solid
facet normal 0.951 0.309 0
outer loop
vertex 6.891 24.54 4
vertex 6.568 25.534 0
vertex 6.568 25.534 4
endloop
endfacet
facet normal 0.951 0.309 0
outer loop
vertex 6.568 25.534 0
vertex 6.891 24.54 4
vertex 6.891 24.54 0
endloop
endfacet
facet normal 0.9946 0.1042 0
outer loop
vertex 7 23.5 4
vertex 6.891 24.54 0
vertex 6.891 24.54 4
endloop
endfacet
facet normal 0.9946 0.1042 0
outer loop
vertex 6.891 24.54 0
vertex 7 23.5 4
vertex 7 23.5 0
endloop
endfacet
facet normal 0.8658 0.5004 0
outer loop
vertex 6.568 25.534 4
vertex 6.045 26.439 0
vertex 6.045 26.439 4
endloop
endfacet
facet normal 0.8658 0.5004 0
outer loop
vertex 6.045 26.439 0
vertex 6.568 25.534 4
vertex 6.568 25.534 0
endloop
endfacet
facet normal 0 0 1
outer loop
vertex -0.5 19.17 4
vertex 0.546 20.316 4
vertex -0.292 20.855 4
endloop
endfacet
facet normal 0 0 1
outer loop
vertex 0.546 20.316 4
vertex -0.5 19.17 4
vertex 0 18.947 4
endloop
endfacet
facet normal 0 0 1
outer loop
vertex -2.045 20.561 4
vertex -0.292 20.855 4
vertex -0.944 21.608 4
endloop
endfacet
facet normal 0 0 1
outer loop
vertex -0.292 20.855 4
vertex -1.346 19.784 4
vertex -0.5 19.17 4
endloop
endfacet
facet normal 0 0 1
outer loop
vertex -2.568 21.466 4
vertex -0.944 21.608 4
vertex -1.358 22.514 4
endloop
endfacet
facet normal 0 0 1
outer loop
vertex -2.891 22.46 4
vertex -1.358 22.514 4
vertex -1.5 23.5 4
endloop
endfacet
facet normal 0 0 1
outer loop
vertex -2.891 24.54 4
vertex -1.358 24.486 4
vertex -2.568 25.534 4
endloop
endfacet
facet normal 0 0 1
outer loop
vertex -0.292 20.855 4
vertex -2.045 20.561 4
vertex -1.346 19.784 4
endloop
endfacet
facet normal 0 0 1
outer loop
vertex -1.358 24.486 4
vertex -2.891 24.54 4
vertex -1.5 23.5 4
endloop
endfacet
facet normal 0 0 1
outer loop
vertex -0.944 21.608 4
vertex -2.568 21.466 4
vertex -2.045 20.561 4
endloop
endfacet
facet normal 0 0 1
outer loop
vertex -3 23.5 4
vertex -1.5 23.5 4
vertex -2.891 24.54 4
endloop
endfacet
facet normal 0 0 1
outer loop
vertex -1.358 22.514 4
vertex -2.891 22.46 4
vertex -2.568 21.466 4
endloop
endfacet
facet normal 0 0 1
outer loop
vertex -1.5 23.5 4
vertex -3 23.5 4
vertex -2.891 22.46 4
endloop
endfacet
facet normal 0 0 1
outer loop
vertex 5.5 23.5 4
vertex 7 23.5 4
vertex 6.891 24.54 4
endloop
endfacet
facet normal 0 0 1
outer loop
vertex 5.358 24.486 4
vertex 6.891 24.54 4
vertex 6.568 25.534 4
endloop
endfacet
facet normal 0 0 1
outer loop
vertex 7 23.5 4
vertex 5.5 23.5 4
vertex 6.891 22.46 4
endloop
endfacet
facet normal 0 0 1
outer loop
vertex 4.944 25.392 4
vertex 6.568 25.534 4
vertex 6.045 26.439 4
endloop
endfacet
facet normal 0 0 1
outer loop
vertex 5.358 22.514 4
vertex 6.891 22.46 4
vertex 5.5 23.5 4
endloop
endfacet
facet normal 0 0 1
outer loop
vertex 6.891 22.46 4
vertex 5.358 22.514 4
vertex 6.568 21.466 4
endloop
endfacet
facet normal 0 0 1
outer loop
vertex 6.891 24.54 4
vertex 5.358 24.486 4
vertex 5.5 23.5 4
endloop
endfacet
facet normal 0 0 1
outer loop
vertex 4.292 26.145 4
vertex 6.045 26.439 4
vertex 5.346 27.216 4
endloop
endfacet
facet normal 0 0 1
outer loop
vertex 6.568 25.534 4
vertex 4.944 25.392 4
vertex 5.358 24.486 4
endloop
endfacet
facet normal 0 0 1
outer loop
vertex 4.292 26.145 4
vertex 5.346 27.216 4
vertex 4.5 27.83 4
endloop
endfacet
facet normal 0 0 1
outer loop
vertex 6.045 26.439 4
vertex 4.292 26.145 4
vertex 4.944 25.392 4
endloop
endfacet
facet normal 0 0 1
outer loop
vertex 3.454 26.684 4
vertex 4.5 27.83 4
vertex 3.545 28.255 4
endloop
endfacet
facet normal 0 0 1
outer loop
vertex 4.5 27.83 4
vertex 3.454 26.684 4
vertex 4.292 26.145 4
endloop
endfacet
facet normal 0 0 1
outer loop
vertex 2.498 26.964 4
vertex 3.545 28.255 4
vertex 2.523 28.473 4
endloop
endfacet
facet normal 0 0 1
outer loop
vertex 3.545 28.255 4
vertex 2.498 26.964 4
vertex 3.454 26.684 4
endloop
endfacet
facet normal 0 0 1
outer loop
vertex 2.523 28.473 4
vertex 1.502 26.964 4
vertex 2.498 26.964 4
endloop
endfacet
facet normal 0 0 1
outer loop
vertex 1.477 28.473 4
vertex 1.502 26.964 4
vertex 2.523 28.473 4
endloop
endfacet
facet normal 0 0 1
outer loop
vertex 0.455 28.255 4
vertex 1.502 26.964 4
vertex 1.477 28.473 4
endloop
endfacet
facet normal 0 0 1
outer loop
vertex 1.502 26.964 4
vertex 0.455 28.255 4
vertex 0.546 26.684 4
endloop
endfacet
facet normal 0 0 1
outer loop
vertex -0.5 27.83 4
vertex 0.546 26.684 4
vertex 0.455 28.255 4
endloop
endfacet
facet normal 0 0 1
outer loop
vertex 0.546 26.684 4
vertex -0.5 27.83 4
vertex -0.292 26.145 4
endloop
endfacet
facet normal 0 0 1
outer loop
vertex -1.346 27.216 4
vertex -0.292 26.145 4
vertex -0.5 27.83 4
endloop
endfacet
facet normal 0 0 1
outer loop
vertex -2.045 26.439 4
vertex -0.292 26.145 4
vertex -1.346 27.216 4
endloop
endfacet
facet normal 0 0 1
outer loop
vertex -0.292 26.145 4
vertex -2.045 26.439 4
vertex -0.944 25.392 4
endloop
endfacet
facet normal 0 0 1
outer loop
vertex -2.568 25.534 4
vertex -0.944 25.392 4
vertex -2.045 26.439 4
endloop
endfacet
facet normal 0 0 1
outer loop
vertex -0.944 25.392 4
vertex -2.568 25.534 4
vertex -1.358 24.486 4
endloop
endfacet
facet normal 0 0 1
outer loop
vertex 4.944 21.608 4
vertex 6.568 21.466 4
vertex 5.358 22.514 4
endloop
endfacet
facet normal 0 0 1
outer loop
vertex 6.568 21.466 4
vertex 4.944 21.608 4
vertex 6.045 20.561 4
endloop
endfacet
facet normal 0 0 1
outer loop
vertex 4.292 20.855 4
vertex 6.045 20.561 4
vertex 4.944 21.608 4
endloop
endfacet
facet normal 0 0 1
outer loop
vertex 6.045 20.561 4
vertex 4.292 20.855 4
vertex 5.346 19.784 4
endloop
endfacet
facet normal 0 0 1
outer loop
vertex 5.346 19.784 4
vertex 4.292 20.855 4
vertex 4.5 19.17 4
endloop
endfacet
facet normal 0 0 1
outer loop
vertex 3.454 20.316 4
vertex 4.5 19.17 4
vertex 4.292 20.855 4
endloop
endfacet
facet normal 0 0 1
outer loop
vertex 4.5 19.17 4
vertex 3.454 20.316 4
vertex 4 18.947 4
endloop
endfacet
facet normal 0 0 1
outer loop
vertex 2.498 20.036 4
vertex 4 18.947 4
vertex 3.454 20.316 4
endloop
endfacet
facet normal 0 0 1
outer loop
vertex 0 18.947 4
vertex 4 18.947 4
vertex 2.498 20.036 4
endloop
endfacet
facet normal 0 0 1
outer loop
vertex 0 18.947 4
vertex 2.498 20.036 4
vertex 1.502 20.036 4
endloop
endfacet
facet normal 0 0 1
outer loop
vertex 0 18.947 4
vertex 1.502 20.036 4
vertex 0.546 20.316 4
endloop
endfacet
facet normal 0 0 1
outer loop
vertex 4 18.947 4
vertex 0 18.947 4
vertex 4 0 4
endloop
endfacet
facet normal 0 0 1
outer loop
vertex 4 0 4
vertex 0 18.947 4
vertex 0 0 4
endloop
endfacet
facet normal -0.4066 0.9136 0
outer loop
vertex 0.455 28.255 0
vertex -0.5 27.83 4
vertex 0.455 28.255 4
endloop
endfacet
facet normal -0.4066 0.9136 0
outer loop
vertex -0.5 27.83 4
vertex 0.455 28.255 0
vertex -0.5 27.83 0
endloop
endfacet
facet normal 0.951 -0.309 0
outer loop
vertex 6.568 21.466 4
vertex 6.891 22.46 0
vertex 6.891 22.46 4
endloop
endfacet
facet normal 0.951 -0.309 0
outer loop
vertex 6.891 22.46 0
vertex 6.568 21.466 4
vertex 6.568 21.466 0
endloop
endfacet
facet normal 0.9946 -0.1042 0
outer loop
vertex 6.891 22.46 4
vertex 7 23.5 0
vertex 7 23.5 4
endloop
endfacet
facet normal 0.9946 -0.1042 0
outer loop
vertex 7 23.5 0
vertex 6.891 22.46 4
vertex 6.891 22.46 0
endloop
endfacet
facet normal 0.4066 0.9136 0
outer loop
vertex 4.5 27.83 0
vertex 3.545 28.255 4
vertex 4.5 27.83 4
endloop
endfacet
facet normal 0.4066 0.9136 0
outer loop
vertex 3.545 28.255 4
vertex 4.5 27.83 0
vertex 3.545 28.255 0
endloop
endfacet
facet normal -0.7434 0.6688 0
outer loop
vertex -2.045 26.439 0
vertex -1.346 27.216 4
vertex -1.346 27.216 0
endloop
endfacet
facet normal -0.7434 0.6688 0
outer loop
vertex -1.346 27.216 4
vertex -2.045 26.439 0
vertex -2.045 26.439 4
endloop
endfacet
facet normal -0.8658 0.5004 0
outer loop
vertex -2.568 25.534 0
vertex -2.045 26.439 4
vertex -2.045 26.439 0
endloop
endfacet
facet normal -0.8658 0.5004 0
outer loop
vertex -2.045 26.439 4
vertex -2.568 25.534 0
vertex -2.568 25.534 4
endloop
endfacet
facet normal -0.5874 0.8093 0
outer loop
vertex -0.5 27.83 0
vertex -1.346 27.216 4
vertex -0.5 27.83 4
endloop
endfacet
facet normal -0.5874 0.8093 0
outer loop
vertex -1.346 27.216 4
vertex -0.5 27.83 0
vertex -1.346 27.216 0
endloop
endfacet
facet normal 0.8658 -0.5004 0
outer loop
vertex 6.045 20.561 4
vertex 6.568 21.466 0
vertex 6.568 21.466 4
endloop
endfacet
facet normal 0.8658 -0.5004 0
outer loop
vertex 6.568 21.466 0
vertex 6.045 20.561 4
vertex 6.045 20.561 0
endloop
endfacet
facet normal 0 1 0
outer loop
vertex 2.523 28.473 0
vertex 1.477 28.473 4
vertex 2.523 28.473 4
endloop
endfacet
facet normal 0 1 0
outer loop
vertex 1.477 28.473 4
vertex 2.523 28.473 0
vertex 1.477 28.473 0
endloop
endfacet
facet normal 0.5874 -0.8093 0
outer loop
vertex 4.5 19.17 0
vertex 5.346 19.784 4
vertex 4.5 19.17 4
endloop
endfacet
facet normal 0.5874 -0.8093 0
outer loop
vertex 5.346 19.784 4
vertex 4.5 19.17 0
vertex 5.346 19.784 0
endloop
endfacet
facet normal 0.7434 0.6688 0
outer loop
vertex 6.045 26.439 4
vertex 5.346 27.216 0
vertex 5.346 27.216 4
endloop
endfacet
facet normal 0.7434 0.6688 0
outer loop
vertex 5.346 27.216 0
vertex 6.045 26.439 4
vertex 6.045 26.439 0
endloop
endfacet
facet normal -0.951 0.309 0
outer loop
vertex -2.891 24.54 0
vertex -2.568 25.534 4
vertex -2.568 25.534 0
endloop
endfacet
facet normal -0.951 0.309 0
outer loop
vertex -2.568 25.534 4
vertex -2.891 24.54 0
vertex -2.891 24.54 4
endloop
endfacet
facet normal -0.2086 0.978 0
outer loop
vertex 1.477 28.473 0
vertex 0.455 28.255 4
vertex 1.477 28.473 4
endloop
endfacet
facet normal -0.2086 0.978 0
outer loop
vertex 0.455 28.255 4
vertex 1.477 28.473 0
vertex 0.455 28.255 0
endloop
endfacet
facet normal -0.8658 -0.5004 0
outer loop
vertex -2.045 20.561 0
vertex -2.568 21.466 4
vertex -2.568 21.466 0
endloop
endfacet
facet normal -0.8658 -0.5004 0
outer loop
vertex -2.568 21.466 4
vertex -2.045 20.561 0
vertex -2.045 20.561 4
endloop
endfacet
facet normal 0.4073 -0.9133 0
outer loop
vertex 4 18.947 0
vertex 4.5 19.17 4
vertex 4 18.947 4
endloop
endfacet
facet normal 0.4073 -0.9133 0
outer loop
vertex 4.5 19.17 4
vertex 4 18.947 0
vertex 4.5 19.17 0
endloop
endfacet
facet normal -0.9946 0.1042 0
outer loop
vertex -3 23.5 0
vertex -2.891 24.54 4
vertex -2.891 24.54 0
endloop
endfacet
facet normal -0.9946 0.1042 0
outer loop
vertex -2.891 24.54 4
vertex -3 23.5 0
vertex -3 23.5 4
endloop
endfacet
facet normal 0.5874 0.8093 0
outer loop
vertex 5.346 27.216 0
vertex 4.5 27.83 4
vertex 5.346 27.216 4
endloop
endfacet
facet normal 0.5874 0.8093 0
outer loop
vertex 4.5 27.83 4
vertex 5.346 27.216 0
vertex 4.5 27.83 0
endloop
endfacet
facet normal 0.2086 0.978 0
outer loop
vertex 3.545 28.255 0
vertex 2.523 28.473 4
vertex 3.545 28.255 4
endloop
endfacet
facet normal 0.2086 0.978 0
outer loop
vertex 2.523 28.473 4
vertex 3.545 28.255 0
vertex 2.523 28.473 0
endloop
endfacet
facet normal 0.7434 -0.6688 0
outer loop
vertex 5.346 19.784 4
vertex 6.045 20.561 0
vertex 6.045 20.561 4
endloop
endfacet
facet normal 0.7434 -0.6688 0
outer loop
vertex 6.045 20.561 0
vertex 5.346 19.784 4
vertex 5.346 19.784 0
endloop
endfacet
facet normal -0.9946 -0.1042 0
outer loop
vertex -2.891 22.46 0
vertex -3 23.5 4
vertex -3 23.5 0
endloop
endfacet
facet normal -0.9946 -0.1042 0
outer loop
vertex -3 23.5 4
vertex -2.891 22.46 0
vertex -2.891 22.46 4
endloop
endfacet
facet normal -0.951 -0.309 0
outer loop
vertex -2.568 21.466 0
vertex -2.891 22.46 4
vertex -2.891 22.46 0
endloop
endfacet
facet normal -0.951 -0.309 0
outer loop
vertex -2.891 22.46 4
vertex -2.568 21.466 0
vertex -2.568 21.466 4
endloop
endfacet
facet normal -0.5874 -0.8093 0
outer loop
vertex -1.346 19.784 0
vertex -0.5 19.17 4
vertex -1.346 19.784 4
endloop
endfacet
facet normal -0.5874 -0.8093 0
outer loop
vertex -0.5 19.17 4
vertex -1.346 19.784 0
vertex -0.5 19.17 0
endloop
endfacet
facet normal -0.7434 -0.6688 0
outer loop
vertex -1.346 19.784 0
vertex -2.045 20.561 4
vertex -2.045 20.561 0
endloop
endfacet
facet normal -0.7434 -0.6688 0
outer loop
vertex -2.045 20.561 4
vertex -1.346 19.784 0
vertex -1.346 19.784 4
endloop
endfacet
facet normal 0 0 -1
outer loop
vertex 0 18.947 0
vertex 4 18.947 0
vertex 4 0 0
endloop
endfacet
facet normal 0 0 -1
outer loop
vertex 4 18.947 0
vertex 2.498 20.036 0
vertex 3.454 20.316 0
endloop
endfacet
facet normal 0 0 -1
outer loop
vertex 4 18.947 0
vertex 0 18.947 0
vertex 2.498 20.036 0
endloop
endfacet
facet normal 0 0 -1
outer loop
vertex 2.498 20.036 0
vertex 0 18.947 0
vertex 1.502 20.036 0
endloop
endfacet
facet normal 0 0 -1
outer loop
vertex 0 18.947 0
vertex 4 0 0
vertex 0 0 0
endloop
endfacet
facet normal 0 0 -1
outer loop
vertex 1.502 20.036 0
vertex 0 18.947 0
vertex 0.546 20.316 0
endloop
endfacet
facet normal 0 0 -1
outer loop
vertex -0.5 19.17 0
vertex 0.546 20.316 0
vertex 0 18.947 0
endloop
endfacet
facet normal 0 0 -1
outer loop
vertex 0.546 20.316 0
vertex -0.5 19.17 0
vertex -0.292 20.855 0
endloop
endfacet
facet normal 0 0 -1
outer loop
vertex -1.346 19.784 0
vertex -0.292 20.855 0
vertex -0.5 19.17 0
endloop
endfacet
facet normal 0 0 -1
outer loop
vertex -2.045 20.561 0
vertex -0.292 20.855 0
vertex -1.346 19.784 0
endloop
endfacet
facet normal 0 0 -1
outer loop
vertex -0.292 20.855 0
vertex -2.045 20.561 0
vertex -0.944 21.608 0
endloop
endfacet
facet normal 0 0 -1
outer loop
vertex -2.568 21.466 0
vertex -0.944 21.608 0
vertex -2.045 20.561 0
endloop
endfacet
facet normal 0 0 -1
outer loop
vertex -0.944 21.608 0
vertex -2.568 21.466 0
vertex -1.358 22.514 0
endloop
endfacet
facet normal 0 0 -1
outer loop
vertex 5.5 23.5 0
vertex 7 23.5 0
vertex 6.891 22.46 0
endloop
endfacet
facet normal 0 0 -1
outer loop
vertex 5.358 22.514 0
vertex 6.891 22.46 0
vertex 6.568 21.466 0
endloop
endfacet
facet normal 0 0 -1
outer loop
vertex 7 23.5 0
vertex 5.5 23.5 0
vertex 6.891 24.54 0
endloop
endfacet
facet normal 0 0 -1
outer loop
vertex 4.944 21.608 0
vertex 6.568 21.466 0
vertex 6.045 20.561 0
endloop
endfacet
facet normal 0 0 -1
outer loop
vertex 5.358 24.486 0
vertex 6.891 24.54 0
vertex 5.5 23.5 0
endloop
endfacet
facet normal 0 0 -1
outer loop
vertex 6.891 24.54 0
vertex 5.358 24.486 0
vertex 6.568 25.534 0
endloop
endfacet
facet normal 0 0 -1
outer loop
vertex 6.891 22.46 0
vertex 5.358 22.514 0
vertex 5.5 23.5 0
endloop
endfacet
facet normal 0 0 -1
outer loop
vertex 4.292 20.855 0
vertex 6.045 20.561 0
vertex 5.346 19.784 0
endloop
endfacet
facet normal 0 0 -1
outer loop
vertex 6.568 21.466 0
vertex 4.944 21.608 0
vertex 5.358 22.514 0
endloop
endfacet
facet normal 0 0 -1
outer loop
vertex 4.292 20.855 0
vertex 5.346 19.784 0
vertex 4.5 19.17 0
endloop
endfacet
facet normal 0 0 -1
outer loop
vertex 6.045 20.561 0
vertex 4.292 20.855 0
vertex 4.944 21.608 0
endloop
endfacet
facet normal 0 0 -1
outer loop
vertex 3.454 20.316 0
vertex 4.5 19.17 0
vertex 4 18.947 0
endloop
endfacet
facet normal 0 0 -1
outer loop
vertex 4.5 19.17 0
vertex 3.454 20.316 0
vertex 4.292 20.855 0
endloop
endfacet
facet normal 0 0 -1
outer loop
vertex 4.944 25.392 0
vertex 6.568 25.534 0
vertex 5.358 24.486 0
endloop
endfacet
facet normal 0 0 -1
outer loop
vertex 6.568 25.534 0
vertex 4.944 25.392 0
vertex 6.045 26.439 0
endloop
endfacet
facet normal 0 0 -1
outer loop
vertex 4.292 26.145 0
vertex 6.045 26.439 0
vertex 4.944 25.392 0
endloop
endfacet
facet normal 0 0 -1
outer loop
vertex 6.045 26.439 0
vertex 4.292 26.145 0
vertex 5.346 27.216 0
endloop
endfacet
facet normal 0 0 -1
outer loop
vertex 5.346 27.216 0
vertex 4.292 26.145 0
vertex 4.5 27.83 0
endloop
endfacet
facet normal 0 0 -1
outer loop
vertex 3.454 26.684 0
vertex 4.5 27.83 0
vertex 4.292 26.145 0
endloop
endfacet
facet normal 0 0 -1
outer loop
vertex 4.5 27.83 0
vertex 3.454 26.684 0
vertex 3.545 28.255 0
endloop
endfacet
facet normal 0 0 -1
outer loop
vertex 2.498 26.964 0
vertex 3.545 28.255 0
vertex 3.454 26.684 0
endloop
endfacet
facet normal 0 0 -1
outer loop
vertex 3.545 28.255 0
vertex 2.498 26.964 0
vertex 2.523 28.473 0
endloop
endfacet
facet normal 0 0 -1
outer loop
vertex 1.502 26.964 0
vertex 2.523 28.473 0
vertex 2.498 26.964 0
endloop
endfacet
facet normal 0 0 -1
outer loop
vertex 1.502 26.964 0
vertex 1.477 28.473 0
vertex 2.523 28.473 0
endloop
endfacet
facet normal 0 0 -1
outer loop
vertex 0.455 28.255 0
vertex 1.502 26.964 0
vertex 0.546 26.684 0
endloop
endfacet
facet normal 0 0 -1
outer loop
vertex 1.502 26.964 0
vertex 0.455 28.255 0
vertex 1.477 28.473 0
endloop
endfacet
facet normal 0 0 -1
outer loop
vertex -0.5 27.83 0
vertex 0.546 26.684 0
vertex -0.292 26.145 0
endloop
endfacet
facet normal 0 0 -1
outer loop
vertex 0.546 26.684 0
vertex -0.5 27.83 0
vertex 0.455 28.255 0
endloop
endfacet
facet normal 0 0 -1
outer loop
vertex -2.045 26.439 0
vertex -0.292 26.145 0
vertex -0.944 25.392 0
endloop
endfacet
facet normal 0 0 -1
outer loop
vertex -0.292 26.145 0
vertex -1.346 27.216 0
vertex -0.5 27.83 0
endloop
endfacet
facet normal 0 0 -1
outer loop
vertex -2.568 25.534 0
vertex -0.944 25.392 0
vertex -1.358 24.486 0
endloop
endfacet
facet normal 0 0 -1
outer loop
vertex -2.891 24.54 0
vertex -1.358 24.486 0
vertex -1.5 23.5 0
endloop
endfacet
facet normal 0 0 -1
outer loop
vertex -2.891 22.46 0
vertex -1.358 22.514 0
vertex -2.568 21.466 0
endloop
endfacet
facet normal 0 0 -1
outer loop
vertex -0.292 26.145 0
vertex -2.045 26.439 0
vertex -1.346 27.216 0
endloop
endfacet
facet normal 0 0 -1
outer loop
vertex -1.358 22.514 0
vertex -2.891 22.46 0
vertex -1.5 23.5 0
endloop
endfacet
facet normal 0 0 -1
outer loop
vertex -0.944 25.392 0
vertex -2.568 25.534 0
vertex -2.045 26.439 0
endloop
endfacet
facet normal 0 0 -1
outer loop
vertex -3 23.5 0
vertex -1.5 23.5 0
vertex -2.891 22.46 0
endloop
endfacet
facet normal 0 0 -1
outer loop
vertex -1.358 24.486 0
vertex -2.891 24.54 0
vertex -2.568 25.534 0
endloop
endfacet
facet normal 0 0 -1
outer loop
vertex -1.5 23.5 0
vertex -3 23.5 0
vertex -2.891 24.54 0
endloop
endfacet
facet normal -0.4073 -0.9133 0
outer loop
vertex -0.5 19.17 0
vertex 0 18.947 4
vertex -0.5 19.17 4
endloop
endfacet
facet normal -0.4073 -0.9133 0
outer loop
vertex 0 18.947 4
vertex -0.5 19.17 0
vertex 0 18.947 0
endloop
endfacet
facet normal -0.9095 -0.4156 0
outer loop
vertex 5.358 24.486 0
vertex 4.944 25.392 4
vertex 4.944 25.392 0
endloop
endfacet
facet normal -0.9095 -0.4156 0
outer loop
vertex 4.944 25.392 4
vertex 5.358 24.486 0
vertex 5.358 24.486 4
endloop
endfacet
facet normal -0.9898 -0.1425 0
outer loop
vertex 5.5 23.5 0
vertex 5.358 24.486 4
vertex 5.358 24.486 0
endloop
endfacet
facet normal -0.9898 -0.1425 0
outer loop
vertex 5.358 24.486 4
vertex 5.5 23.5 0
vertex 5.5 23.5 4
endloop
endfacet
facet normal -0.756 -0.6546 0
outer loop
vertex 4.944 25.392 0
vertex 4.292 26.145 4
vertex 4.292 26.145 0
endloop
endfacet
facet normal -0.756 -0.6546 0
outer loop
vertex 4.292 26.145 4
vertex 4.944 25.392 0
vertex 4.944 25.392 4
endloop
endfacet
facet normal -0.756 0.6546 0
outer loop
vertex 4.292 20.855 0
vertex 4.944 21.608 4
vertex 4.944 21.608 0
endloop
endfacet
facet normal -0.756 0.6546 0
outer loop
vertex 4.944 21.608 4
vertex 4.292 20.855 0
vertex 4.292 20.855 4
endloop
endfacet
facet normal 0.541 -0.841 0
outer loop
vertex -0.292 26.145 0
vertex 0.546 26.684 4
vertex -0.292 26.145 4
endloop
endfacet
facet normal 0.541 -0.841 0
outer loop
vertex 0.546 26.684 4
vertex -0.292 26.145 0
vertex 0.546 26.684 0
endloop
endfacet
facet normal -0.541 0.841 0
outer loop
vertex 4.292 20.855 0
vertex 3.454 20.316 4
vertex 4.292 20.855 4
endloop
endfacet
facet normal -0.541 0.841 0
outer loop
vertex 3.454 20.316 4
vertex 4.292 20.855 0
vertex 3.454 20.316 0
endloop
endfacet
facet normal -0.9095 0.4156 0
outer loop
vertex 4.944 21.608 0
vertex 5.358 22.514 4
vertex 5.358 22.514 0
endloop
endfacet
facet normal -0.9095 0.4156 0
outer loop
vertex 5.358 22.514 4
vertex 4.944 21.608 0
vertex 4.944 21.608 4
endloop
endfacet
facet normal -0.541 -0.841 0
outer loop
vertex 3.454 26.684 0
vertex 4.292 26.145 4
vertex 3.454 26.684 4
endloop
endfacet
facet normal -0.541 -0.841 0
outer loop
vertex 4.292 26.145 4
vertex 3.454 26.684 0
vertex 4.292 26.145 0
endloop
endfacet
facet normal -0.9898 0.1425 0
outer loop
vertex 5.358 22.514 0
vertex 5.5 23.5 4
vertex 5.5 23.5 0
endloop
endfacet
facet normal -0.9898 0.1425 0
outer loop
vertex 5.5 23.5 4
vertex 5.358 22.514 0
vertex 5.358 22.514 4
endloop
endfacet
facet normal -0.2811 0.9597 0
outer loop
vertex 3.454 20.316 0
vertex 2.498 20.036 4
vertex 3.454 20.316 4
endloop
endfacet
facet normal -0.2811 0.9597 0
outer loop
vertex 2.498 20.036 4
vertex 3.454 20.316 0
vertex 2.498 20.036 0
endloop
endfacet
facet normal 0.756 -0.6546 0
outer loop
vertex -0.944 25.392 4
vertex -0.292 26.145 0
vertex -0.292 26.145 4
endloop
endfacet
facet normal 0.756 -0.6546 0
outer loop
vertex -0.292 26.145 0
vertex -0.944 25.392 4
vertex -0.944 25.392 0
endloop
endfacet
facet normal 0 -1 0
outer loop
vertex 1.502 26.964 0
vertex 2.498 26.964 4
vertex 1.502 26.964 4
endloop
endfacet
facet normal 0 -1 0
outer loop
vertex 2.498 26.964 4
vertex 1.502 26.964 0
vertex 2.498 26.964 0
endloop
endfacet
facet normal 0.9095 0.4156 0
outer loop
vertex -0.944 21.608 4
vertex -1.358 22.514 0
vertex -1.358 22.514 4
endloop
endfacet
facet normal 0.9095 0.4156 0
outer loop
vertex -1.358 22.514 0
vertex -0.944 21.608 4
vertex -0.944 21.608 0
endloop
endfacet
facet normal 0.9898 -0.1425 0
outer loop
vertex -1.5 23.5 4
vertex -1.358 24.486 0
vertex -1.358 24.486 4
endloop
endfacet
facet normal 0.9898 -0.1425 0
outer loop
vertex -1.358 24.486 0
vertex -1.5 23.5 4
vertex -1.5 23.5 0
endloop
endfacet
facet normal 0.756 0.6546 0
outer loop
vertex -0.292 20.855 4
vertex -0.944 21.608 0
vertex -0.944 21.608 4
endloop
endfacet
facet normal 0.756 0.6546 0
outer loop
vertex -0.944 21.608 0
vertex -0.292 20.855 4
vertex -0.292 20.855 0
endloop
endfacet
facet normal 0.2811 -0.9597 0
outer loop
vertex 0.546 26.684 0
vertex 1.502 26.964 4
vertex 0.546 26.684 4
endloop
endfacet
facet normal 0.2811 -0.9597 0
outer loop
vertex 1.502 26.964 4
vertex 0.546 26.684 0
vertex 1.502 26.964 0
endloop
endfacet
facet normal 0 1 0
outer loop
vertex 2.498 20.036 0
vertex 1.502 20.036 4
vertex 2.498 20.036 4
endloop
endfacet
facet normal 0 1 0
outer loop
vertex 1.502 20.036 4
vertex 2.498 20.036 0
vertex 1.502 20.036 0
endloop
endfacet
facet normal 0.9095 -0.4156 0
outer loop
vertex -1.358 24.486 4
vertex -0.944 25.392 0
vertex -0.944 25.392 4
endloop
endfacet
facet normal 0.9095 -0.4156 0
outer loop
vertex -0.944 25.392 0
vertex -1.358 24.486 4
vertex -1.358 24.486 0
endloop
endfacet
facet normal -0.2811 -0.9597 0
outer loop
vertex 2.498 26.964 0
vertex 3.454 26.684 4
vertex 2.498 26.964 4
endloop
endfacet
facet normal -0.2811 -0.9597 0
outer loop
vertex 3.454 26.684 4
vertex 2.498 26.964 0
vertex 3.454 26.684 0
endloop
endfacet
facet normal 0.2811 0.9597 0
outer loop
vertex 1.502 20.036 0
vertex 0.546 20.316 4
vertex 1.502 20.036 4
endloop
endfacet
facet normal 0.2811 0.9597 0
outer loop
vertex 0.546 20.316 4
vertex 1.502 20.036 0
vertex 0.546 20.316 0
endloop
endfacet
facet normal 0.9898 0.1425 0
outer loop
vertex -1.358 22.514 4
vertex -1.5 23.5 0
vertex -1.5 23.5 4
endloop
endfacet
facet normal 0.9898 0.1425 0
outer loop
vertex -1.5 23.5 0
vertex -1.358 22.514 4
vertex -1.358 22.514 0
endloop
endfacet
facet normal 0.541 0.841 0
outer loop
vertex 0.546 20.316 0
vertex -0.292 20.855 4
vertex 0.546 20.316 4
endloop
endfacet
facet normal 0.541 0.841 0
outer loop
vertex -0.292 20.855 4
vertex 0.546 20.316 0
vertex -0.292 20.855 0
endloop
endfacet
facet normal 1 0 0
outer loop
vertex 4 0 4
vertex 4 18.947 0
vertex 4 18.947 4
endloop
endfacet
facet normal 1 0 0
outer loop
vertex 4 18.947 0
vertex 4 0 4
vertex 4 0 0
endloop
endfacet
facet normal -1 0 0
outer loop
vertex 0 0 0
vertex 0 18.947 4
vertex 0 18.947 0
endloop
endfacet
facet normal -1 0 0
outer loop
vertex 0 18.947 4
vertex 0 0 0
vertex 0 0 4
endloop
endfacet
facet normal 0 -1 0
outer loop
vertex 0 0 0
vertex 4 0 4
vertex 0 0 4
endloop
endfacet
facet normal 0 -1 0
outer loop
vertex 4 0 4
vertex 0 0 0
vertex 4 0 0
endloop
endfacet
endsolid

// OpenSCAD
module tubeHolderMount(outerDiameter) {
    difference() {
	cylinder(h=4, d=outerDiameter+3, $fs=1);
	translate([0,0,-1]){
	    cylinder(h=6, d=outerDiameter, $fs=1);
	}
    }
}

module tubeHolder(outerDiameter=7) {
    radius=outerDiameter/2;
    cube(size=[4,20,4]);
    translate([2,20+radius,0]){
	tubeHolderMount(outerDiameter);
    }
}

tubeHolder(7);
